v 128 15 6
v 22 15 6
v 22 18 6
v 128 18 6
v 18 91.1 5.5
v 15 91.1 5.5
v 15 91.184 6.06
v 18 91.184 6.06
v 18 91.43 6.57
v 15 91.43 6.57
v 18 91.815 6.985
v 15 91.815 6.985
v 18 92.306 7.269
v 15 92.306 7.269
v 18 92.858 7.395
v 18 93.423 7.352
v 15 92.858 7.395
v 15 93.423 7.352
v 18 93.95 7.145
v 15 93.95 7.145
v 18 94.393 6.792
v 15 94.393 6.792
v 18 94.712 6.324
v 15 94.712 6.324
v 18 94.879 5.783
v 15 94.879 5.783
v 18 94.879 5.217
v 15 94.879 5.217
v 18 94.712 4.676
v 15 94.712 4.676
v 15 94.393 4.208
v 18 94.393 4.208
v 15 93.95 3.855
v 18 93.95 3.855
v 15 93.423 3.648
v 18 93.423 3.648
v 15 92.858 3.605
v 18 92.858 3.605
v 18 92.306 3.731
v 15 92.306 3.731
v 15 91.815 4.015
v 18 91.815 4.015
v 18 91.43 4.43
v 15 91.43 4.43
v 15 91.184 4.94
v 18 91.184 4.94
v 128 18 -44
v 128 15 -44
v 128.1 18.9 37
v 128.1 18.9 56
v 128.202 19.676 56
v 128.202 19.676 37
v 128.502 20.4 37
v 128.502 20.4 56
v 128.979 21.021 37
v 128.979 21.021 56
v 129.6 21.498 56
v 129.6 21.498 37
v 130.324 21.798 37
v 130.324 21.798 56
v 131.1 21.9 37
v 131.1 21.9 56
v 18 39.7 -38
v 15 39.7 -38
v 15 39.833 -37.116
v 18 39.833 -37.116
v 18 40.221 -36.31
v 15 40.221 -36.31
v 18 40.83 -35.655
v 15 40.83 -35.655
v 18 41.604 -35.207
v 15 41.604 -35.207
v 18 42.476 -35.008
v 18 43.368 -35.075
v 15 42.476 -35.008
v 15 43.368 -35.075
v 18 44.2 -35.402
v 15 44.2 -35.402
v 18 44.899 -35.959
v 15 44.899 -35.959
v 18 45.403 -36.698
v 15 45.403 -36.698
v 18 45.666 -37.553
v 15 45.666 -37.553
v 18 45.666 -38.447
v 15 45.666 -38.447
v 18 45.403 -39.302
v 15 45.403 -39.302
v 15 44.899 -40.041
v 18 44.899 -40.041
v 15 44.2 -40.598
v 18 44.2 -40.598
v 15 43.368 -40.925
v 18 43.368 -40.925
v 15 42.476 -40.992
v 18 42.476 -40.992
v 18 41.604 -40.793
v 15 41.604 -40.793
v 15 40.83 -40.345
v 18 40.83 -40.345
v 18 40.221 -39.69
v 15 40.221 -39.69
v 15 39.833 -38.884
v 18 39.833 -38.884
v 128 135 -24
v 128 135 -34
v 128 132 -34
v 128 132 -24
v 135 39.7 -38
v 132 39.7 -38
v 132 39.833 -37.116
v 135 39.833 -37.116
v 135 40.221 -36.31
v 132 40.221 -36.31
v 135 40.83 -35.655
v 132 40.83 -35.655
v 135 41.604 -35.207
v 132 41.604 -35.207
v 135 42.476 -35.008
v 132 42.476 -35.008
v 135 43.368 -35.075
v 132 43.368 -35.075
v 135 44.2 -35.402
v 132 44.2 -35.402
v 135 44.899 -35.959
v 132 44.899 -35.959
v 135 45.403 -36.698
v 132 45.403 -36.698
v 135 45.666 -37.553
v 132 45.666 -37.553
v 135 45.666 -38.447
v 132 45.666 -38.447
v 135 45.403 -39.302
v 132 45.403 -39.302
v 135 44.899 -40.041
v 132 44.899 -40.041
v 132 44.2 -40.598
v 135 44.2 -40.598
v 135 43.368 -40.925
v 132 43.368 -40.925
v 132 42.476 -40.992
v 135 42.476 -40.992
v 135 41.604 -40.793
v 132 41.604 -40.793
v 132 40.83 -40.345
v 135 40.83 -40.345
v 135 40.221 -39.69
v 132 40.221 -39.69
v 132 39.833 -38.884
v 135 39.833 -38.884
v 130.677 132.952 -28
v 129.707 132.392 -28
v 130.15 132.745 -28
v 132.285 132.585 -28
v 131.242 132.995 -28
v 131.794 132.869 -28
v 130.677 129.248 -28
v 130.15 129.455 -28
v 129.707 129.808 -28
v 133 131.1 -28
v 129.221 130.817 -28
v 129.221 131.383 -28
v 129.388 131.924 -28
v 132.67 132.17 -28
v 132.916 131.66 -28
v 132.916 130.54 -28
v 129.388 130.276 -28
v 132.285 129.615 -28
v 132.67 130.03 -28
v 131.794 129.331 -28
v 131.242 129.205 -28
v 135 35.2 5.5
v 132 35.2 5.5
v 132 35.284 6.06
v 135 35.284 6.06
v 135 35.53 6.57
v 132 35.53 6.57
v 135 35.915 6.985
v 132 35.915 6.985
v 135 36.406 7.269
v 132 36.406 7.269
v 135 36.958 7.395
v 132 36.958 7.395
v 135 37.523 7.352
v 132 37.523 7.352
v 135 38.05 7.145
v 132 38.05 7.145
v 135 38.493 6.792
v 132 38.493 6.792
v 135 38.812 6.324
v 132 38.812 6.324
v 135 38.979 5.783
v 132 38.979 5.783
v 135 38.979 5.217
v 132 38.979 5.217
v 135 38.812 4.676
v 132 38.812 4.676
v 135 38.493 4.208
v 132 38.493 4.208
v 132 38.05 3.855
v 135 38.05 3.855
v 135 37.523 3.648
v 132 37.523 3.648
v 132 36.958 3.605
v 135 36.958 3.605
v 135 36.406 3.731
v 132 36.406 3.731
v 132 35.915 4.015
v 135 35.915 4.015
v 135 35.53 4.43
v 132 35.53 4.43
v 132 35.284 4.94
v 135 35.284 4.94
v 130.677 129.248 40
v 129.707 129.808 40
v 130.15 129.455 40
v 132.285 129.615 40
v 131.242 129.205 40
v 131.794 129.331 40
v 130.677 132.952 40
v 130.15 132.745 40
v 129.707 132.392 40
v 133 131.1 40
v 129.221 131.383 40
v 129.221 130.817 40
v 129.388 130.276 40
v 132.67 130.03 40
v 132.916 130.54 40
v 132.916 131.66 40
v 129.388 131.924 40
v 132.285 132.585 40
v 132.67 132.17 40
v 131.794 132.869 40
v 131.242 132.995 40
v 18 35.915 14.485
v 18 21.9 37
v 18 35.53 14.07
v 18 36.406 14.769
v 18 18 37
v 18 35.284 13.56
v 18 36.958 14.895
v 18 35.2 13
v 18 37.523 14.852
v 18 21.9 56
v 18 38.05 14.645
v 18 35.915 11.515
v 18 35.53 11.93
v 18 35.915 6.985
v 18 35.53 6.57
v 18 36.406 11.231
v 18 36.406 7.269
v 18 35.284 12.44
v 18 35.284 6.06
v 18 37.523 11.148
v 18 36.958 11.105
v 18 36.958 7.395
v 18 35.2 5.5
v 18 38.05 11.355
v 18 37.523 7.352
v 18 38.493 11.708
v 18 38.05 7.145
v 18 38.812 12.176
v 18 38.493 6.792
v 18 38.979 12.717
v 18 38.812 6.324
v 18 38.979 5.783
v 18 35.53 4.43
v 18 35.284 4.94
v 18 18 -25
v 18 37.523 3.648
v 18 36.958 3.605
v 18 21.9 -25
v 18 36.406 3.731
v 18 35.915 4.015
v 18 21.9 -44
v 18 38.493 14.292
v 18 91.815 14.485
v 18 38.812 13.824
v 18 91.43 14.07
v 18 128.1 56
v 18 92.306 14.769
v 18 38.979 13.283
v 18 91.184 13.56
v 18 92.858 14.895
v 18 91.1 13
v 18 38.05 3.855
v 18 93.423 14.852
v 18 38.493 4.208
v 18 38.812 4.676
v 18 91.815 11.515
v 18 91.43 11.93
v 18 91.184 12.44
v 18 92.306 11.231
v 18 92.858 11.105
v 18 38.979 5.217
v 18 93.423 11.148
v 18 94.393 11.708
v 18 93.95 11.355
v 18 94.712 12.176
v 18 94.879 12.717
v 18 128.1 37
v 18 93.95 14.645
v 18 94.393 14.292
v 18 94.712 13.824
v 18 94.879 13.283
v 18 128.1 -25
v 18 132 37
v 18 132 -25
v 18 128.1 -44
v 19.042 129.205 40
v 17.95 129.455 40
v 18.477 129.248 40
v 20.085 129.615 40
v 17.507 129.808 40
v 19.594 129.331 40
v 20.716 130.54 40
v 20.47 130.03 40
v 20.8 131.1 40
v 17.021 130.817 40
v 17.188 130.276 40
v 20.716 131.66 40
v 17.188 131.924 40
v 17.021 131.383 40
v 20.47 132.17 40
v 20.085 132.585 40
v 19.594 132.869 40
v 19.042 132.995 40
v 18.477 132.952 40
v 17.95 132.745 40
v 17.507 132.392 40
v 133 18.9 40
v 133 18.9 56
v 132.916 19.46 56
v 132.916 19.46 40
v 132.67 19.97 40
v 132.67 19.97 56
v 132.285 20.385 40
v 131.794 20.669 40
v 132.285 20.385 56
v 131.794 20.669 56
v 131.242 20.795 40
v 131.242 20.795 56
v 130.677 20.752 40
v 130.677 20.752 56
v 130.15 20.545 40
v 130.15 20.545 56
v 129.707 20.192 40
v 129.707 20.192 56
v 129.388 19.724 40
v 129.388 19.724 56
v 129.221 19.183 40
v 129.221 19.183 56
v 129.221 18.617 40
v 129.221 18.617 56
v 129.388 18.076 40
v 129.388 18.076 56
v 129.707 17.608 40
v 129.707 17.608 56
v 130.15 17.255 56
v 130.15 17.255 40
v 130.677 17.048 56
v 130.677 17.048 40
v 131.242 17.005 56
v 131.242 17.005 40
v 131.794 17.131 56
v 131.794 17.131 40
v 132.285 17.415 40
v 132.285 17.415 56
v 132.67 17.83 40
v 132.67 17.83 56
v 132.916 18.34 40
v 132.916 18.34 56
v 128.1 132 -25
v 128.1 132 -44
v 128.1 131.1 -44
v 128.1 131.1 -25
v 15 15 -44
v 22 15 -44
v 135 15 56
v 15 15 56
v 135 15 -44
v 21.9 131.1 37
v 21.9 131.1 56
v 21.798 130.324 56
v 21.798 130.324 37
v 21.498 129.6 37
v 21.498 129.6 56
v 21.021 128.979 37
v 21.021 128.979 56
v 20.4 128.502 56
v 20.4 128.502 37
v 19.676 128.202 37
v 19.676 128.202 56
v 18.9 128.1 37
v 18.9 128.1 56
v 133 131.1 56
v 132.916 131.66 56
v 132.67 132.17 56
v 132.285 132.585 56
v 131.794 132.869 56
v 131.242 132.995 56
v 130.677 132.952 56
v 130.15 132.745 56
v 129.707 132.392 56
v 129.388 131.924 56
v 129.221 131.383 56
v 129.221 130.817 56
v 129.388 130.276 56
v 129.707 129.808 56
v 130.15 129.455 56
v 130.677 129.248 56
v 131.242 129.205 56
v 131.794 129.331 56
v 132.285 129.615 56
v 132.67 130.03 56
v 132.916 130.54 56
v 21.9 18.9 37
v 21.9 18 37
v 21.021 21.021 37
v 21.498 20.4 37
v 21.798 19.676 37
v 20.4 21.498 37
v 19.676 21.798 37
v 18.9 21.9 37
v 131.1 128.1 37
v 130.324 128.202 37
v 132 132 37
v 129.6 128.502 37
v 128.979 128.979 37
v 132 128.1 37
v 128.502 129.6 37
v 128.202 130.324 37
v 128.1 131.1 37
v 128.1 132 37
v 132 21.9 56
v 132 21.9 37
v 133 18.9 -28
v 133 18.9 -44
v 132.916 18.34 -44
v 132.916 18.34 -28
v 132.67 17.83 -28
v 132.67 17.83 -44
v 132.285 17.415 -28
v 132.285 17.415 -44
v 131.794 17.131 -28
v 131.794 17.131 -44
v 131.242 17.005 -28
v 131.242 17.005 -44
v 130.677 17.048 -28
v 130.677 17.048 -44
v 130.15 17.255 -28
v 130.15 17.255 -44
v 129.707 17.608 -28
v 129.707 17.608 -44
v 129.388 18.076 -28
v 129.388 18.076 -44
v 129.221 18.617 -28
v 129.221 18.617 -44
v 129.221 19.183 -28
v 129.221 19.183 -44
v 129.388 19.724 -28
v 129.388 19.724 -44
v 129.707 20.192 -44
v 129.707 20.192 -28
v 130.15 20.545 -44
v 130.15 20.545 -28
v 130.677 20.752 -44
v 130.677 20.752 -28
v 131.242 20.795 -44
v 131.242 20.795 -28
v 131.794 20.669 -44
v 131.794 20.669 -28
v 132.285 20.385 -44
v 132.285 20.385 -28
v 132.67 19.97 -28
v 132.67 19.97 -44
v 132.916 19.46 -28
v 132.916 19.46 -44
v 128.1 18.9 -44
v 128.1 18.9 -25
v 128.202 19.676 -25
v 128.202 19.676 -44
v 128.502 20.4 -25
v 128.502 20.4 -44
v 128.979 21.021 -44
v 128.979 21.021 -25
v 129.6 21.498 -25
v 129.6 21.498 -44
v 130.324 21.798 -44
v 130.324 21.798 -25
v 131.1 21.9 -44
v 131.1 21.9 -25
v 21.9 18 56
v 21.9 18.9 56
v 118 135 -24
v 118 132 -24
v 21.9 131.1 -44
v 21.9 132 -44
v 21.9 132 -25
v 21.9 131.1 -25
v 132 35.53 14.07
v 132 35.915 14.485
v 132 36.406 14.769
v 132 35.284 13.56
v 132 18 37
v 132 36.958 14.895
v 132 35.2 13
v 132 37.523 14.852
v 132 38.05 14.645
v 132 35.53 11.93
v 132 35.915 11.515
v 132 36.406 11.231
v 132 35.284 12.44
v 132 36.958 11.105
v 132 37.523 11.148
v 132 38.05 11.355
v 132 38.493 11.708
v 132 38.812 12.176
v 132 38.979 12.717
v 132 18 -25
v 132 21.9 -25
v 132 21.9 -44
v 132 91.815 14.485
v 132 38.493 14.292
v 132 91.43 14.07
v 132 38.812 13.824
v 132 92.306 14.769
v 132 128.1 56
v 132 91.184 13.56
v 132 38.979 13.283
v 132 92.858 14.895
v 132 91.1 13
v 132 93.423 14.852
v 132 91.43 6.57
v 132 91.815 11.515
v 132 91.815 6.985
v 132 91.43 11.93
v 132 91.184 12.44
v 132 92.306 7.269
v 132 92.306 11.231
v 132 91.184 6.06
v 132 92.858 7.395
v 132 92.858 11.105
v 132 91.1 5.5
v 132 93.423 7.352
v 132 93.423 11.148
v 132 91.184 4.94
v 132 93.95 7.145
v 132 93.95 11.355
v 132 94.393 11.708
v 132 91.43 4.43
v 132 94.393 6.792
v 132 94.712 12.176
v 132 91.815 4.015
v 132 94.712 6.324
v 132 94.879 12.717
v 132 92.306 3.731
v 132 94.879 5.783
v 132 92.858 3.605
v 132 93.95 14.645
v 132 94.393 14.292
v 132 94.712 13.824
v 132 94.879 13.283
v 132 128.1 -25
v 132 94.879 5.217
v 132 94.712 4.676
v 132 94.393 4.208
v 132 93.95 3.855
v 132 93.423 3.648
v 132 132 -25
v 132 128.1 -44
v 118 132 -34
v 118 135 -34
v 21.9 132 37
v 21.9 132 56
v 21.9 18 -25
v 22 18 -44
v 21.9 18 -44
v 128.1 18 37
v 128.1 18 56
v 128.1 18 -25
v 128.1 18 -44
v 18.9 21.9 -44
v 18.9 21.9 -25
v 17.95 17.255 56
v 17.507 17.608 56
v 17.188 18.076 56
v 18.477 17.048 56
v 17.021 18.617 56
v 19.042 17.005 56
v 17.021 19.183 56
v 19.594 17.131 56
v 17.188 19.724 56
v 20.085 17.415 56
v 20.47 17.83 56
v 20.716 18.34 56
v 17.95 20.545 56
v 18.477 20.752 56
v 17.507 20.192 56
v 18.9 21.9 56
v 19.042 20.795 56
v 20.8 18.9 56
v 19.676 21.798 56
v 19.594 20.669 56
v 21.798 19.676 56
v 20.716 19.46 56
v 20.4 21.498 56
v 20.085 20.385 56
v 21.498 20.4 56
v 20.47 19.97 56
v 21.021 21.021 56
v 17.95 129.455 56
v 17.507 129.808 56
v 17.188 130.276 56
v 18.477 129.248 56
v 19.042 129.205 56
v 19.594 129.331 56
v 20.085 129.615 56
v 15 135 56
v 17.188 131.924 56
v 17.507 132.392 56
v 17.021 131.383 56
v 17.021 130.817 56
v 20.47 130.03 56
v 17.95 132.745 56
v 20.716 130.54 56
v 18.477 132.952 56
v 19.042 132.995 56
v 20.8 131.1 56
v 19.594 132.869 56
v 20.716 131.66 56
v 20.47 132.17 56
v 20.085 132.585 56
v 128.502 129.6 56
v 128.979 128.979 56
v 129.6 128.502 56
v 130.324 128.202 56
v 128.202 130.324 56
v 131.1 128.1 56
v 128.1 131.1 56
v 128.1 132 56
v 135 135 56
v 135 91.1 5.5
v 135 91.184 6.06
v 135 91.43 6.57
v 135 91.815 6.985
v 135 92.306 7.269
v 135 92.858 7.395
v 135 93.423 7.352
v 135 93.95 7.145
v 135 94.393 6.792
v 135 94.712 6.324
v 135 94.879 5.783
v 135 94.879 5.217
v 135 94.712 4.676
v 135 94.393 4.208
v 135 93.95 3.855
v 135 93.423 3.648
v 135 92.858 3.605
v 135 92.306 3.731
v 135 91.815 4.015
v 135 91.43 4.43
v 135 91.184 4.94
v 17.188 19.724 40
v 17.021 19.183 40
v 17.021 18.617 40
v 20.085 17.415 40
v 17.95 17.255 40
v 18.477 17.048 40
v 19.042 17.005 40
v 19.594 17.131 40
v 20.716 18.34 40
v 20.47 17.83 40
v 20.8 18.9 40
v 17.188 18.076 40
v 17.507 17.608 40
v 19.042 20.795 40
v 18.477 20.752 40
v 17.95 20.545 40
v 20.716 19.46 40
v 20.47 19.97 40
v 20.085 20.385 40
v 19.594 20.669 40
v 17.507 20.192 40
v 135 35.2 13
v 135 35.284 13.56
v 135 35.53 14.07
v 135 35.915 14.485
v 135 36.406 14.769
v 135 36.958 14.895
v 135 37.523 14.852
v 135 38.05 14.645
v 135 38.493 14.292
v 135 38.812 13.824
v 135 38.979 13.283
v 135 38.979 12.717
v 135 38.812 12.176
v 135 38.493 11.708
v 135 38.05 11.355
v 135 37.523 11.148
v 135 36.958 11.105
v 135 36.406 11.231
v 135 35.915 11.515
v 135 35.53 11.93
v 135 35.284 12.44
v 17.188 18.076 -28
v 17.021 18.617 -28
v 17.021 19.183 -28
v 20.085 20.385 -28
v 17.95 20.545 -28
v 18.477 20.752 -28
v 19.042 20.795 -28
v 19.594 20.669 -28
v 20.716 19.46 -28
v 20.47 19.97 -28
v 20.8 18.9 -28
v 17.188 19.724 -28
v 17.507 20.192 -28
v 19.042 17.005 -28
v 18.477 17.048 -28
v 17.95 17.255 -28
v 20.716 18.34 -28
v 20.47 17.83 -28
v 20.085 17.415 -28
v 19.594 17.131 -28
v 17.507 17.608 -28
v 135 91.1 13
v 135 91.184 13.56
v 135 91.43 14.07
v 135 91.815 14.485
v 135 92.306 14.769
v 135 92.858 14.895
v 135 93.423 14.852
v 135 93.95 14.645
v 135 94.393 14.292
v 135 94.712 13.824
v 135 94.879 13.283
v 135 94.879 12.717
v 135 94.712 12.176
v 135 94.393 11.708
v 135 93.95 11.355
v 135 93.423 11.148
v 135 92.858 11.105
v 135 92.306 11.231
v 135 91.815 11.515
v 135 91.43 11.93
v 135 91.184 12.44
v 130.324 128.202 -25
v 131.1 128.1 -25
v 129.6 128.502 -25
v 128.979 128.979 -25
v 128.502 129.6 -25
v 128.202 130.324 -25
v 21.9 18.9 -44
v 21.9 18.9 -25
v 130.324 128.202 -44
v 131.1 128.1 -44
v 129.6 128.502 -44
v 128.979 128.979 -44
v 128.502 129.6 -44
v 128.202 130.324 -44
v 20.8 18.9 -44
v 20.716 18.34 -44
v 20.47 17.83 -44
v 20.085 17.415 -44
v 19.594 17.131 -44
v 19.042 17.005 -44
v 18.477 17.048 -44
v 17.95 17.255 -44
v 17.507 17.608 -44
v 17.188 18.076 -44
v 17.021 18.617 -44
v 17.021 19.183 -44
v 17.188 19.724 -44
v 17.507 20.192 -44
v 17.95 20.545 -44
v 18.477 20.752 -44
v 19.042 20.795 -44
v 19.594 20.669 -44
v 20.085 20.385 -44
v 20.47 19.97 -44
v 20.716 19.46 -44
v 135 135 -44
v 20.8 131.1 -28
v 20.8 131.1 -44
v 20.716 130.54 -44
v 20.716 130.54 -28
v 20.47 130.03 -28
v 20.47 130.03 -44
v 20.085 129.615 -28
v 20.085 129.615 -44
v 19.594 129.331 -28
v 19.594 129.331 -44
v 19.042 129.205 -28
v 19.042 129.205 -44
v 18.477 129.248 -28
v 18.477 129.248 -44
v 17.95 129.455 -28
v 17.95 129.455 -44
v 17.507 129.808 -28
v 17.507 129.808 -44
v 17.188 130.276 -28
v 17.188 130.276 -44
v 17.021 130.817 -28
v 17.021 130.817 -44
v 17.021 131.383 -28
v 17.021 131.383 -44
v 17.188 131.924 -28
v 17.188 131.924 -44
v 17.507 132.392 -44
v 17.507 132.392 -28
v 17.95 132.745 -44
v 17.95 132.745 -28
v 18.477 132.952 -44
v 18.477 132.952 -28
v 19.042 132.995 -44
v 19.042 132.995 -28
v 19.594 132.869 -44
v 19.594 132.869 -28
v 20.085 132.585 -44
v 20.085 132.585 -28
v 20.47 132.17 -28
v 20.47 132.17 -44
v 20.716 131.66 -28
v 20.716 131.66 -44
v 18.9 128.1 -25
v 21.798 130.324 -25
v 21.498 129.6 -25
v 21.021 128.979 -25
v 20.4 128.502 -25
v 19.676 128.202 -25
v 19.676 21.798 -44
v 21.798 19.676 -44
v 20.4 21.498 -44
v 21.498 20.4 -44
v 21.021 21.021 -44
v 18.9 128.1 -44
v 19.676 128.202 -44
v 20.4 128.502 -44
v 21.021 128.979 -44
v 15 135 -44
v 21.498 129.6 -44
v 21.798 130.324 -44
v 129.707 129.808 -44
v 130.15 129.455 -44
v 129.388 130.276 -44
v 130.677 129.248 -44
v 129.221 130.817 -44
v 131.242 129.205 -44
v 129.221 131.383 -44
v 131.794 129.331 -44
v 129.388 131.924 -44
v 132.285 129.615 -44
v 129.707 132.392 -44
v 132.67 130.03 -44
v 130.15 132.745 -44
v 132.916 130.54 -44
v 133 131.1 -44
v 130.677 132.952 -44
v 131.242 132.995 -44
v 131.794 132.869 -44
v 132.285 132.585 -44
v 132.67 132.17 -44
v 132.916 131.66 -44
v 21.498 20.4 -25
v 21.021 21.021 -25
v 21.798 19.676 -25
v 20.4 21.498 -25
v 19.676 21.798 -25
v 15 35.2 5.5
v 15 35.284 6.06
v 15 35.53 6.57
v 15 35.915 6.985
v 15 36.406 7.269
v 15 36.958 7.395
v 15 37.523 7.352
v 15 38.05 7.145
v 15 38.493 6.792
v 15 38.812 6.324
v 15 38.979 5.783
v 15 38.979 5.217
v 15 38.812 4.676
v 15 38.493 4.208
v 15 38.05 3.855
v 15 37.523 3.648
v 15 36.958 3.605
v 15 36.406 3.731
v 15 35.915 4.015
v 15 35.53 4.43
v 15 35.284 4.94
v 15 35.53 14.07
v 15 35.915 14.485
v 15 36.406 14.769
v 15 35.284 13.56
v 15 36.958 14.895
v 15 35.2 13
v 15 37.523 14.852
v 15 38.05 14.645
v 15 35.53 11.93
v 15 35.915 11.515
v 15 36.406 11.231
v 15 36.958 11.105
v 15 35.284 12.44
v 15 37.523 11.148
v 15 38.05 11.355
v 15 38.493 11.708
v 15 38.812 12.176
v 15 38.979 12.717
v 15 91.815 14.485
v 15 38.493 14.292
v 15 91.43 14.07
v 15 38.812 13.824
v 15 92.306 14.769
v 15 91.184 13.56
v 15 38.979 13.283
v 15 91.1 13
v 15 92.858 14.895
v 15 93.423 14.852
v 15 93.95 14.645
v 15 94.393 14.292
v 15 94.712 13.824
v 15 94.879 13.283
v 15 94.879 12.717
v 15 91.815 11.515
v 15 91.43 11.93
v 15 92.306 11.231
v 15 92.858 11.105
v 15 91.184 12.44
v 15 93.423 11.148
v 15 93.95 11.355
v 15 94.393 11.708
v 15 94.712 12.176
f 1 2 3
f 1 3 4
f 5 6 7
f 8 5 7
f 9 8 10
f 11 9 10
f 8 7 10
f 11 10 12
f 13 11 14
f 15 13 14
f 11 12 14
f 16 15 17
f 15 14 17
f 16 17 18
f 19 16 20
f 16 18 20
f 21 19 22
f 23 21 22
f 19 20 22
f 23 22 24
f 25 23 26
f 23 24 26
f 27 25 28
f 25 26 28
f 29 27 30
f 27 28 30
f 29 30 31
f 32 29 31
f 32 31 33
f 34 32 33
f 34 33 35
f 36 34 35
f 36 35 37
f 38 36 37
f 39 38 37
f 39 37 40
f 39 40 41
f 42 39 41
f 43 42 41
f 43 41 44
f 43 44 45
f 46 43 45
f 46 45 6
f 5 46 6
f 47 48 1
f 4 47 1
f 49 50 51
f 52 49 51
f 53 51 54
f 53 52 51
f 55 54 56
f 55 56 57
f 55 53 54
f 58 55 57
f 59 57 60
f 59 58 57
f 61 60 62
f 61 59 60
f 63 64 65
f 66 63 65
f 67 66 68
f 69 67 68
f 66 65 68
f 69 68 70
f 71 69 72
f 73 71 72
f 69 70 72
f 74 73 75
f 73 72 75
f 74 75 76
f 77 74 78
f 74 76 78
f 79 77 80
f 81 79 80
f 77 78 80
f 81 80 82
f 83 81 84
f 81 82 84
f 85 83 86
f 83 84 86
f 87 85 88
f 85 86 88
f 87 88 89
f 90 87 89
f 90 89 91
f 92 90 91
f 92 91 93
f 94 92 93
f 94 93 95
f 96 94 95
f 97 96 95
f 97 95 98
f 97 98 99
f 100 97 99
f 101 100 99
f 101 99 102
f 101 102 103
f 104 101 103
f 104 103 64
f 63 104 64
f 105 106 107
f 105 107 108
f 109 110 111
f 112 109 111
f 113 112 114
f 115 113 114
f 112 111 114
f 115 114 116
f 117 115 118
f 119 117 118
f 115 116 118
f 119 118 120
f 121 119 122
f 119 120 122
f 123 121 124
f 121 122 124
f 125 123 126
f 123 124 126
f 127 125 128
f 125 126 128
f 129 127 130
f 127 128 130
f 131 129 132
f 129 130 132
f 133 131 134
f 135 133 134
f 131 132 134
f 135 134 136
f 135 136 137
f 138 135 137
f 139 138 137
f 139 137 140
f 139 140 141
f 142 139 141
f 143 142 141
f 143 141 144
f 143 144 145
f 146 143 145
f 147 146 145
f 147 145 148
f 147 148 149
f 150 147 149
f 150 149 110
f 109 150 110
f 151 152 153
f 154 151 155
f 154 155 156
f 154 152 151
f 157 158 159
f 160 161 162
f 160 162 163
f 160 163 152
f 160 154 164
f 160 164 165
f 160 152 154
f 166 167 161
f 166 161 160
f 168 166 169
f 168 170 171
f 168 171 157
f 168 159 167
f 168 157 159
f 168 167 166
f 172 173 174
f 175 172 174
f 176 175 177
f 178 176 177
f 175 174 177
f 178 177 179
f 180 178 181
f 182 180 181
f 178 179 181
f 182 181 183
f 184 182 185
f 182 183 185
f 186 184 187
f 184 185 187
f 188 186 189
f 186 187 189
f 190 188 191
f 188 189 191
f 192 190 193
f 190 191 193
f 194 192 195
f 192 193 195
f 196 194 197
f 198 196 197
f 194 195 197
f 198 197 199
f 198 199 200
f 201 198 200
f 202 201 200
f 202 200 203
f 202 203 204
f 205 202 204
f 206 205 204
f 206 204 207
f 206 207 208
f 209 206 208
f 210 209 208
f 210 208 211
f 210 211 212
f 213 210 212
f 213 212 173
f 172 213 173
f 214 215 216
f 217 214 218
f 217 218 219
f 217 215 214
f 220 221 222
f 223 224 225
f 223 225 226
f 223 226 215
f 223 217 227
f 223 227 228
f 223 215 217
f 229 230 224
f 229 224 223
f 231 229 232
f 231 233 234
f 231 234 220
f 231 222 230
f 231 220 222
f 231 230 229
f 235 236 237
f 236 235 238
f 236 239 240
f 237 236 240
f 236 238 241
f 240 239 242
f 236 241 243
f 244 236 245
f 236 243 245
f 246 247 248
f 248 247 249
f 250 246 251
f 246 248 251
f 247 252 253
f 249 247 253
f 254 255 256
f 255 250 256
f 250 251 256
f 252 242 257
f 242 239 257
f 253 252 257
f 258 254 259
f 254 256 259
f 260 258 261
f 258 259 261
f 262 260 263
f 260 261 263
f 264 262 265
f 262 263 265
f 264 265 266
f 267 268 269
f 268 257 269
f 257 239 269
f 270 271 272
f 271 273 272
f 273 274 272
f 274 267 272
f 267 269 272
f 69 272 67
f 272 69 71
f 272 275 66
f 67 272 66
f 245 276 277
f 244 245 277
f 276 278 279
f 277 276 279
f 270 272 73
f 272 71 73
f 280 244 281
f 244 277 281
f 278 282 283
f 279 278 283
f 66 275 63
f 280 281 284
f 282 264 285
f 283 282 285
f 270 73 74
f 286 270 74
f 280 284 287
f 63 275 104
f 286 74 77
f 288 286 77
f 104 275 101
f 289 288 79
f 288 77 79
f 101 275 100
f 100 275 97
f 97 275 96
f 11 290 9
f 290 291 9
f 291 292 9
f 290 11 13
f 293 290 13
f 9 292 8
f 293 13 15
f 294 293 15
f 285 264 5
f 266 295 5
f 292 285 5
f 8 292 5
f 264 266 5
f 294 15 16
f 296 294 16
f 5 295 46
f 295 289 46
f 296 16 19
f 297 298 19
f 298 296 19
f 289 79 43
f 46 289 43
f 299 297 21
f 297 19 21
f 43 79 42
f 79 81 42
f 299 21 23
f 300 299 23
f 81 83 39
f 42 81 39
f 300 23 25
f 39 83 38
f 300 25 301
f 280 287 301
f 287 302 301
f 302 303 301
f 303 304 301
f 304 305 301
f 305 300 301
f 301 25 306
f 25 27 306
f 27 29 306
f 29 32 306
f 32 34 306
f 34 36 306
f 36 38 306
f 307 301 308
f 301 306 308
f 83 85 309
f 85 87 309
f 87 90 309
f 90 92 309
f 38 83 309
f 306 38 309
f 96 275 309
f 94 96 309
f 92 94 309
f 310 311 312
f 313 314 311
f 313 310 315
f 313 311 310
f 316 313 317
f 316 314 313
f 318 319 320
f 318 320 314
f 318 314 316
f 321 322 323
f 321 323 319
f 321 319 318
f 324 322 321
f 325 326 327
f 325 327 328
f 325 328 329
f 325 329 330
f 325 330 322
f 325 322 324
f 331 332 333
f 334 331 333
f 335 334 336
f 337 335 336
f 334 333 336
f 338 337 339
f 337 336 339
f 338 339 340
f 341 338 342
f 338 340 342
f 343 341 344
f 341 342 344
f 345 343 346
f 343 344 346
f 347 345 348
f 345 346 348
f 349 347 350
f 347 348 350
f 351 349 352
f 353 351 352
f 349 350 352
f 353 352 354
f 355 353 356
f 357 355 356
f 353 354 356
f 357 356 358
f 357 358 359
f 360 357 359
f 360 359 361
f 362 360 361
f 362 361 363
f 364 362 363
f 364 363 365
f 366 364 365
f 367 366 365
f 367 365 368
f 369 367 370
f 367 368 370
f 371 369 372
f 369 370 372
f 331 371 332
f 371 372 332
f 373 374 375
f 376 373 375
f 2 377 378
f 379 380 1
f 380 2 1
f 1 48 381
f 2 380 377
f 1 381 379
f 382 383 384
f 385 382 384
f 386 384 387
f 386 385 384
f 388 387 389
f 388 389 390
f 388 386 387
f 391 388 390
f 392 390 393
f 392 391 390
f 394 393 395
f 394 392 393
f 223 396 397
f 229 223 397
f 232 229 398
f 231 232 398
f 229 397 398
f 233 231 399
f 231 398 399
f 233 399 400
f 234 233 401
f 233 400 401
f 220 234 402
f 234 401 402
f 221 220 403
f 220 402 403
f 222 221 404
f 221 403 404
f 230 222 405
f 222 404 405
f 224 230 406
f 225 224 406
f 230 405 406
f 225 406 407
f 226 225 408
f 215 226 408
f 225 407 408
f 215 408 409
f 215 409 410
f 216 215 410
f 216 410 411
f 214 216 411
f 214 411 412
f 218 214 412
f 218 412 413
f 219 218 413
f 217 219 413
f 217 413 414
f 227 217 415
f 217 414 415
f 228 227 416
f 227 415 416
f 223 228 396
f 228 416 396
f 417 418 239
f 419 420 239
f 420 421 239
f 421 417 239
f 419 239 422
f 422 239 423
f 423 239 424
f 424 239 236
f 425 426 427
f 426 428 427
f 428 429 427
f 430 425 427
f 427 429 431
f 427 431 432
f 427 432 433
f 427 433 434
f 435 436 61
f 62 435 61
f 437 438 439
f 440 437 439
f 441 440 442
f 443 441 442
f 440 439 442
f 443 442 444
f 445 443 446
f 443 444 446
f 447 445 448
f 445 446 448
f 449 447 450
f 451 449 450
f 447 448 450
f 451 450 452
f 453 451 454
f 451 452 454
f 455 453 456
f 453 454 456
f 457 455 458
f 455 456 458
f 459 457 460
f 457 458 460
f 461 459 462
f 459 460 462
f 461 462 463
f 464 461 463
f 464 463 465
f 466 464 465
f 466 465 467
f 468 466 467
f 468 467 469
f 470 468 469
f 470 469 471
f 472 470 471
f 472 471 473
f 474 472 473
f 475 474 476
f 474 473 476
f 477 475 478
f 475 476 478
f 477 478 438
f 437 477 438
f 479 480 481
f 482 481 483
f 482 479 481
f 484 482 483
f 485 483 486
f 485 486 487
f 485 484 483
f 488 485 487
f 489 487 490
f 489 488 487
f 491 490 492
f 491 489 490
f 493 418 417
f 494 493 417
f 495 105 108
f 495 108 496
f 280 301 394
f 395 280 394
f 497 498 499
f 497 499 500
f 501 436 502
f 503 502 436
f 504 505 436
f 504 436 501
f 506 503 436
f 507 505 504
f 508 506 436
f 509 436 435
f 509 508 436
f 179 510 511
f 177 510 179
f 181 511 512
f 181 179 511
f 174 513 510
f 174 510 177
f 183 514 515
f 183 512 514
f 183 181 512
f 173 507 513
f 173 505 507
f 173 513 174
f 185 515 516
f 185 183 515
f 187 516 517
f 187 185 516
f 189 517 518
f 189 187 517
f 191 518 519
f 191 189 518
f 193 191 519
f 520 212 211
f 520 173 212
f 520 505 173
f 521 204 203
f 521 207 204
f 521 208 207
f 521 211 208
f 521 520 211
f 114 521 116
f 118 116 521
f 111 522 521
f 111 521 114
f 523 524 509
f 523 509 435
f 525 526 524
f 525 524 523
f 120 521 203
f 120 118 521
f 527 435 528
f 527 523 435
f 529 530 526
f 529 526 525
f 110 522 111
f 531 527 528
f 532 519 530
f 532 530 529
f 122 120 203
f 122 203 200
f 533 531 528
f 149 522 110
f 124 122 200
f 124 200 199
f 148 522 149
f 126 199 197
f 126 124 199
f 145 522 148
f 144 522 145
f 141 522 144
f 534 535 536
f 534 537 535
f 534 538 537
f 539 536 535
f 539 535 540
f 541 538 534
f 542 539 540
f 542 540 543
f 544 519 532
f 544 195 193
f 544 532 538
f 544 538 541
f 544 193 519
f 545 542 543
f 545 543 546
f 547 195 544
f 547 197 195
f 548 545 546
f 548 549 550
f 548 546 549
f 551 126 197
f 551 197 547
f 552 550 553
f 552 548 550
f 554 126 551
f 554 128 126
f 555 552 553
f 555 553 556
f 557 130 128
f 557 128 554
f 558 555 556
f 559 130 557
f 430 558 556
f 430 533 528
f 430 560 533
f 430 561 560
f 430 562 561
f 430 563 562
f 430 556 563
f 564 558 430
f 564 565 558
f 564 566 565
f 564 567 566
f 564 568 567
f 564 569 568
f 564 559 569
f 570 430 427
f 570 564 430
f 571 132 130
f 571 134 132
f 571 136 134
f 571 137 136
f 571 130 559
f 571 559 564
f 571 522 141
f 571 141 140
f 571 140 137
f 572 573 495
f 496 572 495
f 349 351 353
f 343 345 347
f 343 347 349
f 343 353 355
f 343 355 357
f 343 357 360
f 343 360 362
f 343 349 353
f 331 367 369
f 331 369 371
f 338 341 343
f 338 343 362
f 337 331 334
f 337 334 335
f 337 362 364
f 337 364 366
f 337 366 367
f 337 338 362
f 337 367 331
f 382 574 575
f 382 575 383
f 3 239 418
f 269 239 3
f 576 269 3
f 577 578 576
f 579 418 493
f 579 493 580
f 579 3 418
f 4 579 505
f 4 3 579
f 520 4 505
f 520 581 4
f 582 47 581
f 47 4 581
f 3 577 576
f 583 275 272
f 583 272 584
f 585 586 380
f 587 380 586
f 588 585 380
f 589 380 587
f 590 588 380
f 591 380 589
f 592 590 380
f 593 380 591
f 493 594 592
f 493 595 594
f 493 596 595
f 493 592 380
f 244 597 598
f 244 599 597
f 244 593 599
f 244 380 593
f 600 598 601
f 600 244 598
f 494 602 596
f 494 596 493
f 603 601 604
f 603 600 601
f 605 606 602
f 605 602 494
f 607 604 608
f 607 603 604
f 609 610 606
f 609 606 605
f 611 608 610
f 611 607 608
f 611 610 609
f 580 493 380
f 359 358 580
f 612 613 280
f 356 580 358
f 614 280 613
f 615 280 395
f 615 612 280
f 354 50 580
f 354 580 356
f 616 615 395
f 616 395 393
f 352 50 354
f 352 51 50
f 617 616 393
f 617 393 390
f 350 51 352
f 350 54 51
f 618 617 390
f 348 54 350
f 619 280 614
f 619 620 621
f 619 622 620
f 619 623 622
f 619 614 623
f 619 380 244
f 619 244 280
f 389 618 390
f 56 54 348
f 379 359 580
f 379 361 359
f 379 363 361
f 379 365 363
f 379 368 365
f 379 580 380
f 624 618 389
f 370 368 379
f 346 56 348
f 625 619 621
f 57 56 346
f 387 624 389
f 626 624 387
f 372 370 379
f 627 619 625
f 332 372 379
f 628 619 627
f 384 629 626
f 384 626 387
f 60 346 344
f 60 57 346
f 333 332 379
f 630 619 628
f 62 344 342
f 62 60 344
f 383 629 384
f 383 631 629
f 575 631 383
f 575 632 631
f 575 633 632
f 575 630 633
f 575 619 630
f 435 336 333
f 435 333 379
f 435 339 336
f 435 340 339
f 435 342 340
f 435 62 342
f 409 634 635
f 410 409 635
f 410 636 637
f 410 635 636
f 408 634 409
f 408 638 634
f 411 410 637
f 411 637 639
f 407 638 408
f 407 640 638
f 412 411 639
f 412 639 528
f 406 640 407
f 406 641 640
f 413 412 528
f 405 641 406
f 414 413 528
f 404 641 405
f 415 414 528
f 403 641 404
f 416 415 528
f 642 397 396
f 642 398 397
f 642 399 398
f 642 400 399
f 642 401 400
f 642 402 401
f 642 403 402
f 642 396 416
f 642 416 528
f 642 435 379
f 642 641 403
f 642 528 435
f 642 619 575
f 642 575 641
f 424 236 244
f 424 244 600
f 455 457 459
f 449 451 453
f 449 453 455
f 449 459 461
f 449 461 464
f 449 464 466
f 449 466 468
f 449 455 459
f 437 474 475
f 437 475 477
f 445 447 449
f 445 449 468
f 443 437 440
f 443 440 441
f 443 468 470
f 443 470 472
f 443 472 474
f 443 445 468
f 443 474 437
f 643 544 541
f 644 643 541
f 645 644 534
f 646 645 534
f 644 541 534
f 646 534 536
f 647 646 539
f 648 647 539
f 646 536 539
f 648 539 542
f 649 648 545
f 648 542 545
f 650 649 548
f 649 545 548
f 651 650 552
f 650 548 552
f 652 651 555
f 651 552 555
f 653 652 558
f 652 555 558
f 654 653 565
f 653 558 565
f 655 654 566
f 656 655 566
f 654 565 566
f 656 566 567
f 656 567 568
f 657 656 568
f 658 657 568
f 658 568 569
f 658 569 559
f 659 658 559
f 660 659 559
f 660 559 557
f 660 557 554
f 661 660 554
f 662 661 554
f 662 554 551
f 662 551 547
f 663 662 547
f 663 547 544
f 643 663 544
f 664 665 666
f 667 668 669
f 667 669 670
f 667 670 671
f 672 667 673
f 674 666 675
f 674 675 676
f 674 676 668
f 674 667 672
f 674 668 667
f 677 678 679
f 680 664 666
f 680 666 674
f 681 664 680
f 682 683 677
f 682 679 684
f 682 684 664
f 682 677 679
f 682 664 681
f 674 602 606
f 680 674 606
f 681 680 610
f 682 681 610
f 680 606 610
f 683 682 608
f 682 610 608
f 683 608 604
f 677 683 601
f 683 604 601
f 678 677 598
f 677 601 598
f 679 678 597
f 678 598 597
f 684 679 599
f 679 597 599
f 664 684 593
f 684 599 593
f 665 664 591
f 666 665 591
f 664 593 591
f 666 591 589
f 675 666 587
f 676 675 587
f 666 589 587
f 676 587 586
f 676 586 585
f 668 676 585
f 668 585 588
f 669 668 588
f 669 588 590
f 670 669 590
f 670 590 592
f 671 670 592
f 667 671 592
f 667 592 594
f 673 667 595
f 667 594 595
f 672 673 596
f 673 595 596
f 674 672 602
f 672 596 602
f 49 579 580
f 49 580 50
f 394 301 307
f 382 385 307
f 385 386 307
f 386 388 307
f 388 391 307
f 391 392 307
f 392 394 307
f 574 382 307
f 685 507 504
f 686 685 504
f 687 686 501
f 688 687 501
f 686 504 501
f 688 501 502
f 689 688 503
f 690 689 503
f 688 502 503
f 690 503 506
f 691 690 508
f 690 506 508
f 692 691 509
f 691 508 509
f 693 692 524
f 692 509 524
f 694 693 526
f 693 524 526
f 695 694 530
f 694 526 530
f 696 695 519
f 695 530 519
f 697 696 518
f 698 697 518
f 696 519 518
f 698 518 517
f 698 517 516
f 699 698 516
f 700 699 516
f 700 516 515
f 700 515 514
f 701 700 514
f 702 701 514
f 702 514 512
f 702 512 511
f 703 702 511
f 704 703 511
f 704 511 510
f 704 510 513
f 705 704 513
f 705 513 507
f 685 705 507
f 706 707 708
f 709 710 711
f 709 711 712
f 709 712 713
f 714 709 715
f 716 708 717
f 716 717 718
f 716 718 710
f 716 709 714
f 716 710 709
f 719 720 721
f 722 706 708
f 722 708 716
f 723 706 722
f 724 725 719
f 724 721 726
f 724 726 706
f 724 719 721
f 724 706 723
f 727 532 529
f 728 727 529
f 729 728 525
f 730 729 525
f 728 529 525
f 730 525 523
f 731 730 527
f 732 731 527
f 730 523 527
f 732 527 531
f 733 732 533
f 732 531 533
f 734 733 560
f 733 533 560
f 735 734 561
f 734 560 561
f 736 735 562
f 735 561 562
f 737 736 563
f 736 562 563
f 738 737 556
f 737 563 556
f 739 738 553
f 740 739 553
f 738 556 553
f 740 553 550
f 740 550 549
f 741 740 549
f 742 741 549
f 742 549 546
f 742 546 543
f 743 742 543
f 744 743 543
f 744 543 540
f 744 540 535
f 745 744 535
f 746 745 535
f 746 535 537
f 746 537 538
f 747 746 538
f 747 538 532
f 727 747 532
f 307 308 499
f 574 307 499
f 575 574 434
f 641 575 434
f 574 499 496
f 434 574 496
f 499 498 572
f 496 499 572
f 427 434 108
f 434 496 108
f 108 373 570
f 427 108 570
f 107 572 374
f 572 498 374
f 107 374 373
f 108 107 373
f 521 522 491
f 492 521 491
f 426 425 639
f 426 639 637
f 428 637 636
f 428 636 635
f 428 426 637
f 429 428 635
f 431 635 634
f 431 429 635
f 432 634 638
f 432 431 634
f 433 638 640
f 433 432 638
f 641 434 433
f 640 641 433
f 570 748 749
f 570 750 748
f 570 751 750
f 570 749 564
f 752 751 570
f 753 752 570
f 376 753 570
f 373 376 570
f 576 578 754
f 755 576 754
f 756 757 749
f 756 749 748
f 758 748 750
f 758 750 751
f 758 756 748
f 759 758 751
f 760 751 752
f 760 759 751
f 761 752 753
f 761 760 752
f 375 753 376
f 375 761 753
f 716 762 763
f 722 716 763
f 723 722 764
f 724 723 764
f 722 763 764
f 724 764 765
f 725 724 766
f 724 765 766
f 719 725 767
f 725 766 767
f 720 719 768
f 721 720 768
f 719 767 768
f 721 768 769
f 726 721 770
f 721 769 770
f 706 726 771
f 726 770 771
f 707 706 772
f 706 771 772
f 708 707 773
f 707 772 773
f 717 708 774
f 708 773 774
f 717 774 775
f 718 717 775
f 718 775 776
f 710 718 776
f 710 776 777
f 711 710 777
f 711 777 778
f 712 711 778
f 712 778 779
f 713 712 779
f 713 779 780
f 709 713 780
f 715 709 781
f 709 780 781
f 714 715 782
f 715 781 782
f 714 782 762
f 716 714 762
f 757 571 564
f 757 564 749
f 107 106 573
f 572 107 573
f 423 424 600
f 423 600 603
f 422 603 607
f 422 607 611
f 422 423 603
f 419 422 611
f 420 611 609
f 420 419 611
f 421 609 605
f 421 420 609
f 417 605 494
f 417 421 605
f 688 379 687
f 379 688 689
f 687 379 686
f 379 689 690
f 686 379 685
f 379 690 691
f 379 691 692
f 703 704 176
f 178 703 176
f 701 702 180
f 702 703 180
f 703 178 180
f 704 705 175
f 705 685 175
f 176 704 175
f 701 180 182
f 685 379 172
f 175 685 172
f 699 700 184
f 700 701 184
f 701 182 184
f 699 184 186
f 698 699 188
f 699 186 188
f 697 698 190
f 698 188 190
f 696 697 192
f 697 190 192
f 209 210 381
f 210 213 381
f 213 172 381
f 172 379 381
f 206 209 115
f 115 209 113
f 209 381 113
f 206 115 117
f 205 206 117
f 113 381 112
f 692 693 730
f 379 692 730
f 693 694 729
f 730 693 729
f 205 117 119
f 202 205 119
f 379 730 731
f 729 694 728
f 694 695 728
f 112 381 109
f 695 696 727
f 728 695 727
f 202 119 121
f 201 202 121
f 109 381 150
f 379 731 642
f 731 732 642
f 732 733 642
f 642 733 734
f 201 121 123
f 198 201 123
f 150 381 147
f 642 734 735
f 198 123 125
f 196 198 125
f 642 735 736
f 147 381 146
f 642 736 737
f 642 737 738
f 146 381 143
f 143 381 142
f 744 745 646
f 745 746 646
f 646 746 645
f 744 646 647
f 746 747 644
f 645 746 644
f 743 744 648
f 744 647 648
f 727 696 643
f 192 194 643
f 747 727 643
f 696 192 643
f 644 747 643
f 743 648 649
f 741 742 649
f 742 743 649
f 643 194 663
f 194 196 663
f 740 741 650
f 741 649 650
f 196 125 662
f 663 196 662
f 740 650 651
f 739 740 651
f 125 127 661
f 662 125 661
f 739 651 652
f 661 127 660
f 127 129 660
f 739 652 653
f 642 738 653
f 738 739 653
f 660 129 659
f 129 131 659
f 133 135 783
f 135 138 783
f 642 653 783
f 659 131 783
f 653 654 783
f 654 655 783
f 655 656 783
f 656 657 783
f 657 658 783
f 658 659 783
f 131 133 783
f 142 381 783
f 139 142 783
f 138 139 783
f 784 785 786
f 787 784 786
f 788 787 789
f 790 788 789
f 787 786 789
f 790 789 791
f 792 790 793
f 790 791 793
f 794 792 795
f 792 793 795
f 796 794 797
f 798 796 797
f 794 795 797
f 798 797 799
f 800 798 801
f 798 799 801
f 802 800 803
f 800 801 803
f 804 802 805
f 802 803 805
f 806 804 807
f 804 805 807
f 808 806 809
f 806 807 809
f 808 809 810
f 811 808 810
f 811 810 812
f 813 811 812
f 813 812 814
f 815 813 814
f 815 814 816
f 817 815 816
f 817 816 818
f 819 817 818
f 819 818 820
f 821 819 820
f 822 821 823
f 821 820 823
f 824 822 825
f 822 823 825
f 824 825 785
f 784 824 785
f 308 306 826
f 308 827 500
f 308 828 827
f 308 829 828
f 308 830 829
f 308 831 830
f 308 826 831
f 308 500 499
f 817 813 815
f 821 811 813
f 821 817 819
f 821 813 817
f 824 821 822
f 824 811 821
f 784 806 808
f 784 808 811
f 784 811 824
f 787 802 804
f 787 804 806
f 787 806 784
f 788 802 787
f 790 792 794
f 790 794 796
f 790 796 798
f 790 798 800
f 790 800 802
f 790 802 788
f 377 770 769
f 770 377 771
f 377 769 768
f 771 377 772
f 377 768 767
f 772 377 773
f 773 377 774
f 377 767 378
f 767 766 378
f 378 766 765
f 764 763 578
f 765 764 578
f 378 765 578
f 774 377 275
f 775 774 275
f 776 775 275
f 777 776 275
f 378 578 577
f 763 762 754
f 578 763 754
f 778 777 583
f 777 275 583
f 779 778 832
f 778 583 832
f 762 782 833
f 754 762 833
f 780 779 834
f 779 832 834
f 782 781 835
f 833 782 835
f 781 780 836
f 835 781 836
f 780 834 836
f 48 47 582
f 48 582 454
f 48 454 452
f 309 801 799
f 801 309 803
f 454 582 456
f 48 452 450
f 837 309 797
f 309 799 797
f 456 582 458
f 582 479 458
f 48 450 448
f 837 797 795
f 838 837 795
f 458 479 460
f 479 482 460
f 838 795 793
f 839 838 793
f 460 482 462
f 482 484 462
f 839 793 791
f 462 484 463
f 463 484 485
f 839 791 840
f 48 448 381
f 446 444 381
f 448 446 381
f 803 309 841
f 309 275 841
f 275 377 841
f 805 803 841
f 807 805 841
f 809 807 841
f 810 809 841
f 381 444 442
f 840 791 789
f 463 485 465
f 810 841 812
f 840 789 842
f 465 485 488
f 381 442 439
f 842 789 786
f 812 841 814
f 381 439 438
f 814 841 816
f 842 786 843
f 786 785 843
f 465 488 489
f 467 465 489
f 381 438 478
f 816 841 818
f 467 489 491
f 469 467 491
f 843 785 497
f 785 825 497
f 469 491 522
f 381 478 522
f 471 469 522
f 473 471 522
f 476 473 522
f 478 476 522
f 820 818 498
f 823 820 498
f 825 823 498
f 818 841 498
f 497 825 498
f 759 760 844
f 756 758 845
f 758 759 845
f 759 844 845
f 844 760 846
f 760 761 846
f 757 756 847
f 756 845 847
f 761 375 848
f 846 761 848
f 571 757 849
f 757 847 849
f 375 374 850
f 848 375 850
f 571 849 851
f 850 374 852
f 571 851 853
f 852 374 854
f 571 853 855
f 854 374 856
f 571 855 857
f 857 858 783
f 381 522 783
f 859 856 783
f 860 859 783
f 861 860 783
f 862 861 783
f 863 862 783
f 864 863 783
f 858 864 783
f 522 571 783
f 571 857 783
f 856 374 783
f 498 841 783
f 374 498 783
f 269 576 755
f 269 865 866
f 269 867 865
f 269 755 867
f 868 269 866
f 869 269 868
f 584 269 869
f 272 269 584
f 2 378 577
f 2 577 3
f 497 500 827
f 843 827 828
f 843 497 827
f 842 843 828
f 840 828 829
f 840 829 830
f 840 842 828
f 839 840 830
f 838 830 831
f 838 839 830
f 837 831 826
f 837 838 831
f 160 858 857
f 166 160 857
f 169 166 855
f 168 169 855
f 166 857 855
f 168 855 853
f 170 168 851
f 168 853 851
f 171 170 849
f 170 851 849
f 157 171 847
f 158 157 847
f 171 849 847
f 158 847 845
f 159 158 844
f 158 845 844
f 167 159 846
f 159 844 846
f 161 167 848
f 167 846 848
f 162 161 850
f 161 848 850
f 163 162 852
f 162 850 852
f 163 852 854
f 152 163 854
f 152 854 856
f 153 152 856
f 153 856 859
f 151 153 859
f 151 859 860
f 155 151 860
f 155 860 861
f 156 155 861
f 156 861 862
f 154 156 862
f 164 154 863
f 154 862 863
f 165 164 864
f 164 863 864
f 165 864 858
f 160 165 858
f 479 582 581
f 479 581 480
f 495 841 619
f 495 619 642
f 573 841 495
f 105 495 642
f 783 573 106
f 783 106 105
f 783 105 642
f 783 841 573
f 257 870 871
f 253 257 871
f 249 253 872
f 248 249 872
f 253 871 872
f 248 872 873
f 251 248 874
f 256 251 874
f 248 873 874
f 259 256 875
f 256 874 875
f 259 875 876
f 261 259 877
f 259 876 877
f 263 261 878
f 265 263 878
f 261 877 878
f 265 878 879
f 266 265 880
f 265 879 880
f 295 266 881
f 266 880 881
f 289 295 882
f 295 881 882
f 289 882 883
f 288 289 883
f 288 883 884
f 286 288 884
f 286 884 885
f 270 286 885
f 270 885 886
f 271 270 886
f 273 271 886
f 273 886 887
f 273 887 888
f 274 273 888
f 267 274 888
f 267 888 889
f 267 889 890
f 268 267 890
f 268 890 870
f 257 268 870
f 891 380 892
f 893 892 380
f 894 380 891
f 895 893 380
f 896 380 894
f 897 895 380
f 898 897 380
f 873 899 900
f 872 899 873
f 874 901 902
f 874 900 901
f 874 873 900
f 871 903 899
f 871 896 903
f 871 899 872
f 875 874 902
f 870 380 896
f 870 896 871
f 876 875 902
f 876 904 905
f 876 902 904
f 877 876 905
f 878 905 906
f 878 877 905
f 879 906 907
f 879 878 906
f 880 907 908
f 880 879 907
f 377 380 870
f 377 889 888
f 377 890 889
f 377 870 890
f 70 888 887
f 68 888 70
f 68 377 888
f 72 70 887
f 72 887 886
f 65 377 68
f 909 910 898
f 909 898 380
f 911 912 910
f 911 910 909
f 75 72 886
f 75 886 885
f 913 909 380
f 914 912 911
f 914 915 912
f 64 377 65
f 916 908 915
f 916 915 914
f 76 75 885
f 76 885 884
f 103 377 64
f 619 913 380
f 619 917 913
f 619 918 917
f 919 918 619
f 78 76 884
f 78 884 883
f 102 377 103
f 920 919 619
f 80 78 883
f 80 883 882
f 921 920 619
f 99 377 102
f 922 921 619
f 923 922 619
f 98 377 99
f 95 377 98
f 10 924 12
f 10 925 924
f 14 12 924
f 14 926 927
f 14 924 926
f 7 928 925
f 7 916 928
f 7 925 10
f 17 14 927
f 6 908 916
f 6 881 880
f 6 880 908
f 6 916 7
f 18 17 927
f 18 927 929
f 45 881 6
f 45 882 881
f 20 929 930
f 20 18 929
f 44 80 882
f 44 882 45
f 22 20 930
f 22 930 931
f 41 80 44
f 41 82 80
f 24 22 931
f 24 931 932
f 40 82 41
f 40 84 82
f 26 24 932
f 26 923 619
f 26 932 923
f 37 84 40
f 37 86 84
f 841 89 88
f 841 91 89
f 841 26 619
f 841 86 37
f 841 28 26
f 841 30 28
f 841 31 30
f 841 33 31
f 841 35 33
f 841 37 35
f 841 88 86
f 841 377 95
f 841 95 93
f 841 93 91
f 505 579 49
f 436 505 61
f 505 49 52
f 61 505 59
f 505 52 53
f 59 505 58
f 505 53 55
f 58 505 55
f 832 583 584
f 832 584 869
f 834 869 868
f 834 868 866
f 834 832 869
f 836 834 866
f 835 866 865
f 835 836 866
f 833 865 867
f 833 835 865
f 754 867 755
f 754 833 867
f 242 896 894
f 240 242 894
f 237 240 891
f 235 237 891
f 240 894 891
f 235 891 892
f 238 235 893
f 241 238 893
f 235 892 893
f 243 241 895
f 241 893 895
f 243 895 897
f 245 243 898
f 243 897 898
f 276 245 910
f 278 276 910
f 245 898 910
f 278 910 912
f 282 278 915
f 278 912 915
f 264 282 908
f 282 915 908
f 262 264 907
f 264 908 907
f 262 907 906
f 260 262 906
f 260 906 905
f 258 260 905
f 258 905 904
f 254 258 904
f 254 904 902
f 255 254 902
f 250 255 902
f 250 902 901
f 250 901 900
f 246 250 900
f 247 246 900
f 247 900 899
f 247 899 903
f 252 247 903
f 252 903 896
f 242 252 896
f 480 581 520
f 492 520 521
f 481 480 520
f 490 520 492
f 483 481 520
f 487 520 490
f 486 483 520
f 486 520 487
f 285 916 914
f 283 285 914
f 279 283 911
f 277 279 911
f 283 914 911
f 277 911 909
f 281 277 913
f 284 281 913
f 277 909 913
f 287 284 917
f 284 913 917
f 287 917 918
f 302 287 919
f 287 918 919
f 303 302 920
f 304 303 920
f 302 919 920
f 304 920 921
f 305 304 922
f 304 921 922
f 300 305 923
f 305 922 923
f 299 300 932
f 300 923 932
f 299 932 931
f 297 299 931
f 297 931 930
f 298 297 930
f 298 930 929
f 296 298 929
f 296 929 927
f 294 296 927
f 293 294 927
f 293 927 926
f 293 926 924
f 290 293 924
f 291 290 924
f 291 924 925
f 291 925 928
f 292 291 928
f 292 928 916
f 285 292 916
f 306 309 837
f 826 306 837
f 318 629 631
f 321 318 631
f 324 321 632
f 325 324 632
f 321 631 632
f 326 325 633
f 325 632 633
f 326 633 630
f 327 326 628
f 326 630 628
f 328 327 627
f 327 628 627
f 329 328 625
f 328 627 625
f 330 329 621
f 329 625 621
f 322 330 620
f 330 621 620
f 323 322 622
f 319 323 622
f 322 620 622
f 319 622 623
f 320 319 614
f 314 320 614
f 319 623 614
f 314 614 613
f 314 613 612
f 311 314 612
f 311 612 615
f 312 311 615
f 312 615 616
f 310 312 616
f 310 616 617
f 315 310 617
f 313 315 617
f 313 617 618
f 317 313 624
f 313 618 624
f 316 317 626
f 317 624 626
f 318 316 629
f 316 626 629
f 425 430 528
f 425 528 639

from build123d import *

# Parameters (mm, degrees)
SKETCH007_W     = 120
SKETCH007_H     = 120
PAD002_DEPTH    = 100
POCKET005_DEPTH = 100.001
SKETCH009_R     = 1.9
POCKET006_DEPTH = 16
SKETCH010_W     = 3.9
SKETCH010_H     = 62
POCKET007_DEPTH = 114
SKETCH011_R     = 1.9
POCKET008_DEPTH = 16
SKETCH012_R     = 1.9
POCKET009_DEPTH = 120.001
SKETCH013_W     = 106
SKETCH013_H     = 50
POCKET010_DEPTH = 3
SKETCH014_R     = 3
POCKET011_DEPTH = 120.001
SKETCH015_W     = 10
SKETCH015_H     = 10
POCKET012_DEPTH = 3


with BuildPart() as part:
    # Sketch007 → Pad002 (new body)
    with BuildSketch(Plane.XY):
        with Locations((75, 75)):
            Rectangle(SKETCH007_W, SKETCH007_H)
    extrude(amount=PAD002_DEPTH)

    # Sketch008 (on Face5 of Pad002) → Pocket005 (cut, through all)
    with BuildSketch(Plane(origin=(0, 0, 0), x_dir=(1, 0, 0), z_dir=(0, 0, -1))):
        with BuildLine():
            Line((21.9, -18), (128.1, -18))
            Line((128.1, -18), (128.1, -18.9))
            ThreePointArc((128.1, -18.9), (128.97868, -21.02132), (131.1, -21.9))
            Line((132, -21.9), (131.1, -21.9))
            Line((132, -21.9), (132, -128.1))
            Line((132, -128.1), (131.1, -128.1))
            ThreePointArc((131.1, -128.1), (128.97868, -128.97868), (128.1, -131.1))
            Line((128.1, -132), (128.1, -131.1))
            Line((21.9, -132), (128.1, -132))
            Line((21.9, -132), (21.9, -131.1))
            ThreePointArc((21.9, -131.1), (21.02132, -128.97868), (18.9, -128.1))
            Line((18, -128.1), (18.9, -128.1))
            Line((18, -21.9), (18, -128.1))
            Line((18, -21.9), (18.9, -21.9))
            ThreePointArc((18.9, -21.9), (21.02132, -21.02132), (21.9, -18.9))
            Line((21.9, -18), (21.9, -18.9))
        make_face()
    extrude(amount=-POCKET005_DEPTH, mode=Mode.SUBTRACT)

    # Sketch009 (on Face5 of Pocket005) → Pocket006 (cut)
    with BuildSketch(Plane.XY.offset(100)):
        with Locations((18.9, 18.9)):
            Circle(SKETCH009_R)
        with Locations((131.1, 18.9)):
            Circle(SKETCH009_R)
        with Locations((131.1, 131.1)):
            Circle(SKETCH009_R)
        with Locations((18.9, 131.1)):
            Circle(SKETCH009_R)
    extrude(amount=-POCKET006_DEPTH, mode=Mode.SUBTRACT)

    # Sketch010 (on Face7 of Pocket006) → Pocket007 (cut)
    with BuildSketch(Plane.YZ.offset(18)):
        with Locations((19.95, 50)):
            Rectangle(SKETCH010_W, SKETCH010_H)
        with Locations((130.05, 50)):
            Rectangle(SKETCH010_W, SKETCH010_H)
    extrude(amount=POCKET007_DEPTH, mode=Mode.SUBTRACT)

    # Sketch011 (on Face4 of Pocket007) → Pocket008 (cut)
    with BuildSketch(Plane(origin=(0, 0, 0), x_dir=(1, 0, 0), z_dir=(0, 0, -1))):
        with Locations((18.9, -131.1)):
            Circle(SKETCH011_R)
        with Locations((18.9, -18.9)):
            Circle(SKETCH011_R)
        with Locations((131.1, -18.9)):
            Circle(SKETCH011_R)
        with Locations((131.1, -131.1)):
            Circle(SKETCH011_R)
    extrude(amount=-POCKET008_DEPTH, mode=Mode.SUBTRACT)

    # Sketch012 (on Face2 of Pocket008) → Pocket009 (cut, through all)
    with BuildSketch(Plane(origin=(15, 0, 0), x_dir=(0, -1, 0), z_dir=(-1, 0, 0))):
        with Locations((-37.1, 57)):
            Circle(SKETCH012_R)
        with Locations((-37.1, 49.5)):
            Circle(SKETCH012_R)
        with Locations((-93, 57)):
            Circle(SKETCH012_R)
        with Locations((-93, 49.5)):
            Circle(SKETCH012_R)
    extrude(amount=-POCKET009_DEPTH, mode=Mode.SUBTRACT)

    # Sketch013 (on Face6 of Pocket009) → Pocket010 (cut)
    with BuildSketch(Plane.XZ.offset(-15)):
        with Locations((75, 25)):
            Rectangle(SKETCH013_W, SKETCH013_H)
    extrude(amount=-POCKET010_DEPTH, mode=Mode.SUBTRACT)

    # Sketch014 (on Face2 of Pocket010) → Pocket011 (cut, through all)
    with BuildSketch(Plane(origin=(15, 0, 0), x_dir=(0, -1, 0), z_dir=(-1, 0, 0))):
        with Locations((-42.7, 6)):
            Circle(SKETCH014_R)
    extrude(amount=-POCKET011_DEPTH, mode=Mode.SUBTRACT)

    # Sketch015 (on Face1 of Pocket011) → Pocket012 (cut)
    with BuildSketch(Plane(origin=(0, 135, 0), x_dir=(-1, 0, 0), z_dir=(0, 1, 0))):
        with Locations((-123, 15)):
            Rectangle(SKETCH015_W, SKETCH015_H)
    extrude(amount=-POCKET012_DEPTH, mode=Mode.SUBTRACT)


with BuildPart() as part_1:
    # Body009 placement: moved
    add(part.part.moved(Location((0, 0, -44))))


solid = part_1.part
